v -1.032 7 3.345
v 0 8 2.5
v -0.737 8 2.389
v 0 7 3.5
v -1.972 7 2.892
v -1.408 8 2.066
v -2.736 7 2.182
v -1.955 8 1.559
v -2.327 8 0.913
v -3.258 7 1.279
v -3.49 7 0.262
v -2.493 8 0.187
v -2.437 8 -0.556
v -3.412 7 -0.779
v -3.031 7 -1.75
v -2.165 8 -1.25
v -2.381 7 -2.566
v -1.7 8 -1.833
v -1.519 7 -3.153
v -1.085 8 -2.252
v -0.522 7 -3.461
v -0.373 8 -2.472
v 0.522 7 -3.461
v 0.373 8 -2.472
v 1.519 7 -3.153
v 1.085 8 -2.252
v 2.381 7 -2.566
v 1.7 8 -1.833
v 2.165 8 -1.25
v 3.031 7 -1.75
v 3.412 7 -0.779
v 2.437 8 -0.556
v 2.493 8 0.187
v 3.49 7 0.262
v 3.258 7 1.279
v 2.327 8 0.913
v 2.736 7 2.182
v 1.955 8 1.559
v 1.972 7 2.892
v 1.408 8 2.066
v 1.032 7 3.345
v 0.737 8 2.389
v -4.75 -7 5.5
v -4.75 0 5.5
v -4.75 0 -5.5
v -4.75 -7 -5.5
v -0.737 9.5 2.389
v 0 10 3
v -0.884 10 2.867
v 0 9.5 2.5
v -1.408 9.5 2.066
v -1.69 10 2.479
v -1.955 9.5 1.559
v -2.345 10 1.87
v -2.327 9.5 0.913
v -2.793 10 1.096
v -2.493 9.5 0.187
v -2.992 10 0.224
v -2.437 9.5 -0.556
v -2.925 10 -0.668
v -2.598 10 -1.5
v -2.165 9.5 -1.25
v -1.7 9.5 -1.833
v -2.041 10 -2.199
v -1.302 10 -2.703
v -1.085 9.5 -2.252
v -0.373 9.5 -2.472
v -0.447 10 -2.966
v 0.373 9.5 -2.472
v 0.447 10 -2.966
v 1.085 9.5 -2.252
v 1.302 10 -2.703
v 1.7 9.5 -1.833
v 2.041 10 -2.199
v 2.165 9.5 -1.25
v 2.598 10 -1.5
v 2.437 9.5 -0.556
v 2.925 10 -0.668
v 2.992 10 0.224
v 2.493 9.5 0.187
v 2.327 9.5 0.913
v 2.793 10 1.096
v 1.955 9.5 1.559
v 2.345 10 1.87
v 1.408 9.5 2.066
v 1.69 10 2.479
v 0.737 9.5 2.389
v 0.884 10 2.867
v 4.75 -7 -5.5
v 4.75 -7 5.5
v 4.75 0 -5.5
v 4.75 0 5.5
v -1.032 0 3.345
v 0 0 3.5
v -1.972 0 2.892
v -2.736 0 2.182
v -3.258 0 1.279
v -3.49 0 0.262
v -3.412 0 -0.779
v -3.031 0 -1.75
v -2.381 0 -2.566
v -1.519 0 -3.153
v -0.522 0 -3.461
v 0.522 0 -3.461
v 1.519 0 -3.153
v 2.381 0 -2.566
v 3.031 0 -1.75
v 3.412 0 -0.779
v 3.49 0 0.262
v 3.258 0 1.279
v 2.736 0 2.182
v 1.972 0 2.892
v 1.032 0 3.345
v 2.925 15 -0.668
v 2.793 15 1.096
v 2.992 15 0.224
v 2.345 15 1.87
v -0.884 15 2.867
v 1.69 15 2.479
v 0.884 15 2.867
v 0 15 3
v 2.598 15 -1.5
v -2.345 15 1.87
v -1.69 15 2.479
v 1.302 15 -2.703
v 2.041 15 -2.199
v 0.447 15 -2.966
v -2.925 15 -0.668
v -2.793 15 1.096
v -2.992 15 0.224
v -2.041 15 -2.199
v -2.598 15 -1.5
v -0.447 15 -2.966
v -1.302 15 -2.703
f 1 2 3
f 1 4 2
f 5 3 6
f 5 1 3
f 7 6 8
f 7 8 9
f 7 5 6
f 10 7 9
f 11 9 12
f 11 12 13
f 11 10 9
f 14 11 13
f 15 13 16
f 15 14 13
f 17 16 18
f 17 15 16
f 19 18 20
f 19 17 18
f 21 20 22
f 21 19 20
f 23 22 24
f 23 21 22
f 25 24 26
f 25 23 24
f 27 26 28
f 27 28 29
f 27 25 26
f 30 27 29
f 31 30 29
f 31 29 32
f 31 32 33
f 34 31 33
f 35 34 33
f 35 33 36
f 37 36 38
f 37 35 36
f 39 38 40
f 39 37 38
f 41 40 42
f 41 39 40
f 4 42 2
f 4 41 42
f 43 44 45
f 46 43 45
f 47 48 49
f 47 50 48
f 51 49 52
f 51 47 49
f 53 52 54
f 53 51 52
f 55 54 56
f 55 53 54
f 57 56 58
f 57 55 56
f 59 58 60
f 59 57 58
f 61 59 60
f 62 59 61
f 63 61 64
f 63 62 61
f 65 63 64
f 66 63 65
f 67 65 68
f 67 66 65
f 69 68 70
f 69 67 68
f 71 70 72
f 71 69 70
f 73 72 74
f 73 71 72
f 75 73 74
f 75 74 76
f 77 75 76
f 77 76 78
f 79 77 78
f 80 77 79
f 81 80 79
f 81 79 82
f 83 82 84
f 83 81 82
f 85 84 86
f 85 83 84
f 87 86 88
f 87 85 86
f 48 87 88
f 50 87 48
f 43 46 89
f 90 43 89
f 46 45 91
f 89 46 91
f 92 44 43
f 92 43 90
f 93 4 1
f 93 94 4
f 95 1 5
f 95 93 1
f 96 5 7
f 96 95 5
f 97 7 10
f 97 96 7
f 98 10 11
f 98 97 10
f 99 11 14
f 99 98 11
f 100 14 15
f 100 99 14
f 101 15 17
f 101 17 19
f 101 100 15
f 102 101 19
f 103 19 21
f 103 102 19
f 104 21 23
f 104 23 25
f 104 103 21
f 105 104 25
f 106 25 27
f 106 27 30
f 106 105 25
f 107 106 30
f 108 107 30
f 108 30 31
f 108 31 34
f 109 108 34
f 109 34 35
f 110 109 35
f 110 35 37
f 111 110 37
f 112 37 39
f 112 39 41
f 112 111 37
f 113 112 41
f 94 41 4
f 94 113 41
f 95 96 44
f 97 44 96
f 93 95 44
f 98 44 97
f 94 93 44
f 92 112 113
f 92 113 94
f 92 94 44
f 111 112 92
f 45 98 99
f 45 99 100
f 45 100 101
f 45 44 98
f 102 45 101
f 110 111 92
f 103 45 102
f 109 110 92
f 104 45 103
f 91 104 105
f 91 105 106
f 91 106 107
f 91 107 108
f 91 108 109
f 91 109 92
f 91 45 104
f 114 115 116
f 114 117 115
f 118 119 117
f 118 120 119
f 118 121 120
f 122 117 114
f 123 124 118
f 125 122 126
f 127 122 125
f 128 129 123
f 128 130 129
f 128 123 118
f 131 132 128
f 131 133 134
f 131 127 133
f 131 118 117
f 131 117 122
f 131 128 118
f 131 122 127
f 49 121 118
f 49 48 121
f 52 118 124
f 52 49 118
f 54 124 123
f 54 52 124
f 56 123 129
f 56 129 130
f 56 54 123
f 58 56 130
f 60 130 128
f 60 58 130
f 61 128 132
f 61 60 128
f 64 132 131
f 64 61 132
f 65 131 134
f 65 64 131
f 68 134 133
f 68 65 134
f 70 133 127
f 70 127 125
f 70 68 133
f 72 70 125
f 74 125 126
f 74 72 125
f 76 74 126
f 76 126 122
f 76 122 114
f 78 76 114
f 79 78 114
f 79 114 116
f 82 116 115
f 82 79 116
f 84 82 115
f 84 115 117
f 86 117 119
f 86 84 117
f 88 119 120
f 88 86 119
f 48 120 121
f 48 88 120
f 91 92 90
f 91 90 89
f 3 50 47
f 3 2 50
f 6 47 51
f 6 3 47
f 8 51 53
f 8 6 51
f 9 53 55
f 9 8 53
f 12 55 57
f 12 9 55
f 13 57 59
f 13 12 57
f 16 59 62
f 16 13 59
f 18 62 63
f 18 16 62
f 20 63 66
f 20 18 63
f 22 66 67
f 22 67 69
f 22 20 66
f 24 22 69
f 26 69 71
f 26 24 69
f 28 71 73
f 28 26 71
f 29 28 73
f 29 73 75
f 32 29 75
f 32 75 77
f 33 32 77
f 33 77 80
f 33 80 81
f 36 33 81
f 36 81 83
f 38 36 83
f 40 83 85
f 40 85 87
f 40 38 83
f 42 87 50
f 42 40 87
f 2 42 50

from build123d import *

# Parameters (mm, degrees)
ESQUISSE1_W        = 9.5
ESQUISSE1_H        = 11
BOSS_EXTRU_1_DEPTH = 7


with BuildPart() as part:
    # Esquisse1 → Boss.-Extru.1 (new body)
    with BuildSketch(Plane(origin=(0, 0, 0), x_dir=(1, 0, 0), z_dir=(0, 1, 0))):
        Rectangle(ESQUISSE1_W, ESQUISSE1_H)
    extrude(amount=-BOSS_EXTRU_1_DEPTH)

    # Esquisse3 → Révolution1 (revolve)
    with BuildSketch(Plane.XY, mode=Mode.PRIVATE) as r_volution1_sk:
        Polygon((0, 0), (0, 15), (3, 15), (3, 10), (2.5, 9.5), (2.5, 8), (3.5, 7), (3.5, 0), align=None)
    revolve(r_volution1_sk.sketch.rotate(Axis((0, 0, 0), (0, -1, 0)), 90), axis=Axis((0, 0, 0), (0, -1, 0)))


solid = part.part
